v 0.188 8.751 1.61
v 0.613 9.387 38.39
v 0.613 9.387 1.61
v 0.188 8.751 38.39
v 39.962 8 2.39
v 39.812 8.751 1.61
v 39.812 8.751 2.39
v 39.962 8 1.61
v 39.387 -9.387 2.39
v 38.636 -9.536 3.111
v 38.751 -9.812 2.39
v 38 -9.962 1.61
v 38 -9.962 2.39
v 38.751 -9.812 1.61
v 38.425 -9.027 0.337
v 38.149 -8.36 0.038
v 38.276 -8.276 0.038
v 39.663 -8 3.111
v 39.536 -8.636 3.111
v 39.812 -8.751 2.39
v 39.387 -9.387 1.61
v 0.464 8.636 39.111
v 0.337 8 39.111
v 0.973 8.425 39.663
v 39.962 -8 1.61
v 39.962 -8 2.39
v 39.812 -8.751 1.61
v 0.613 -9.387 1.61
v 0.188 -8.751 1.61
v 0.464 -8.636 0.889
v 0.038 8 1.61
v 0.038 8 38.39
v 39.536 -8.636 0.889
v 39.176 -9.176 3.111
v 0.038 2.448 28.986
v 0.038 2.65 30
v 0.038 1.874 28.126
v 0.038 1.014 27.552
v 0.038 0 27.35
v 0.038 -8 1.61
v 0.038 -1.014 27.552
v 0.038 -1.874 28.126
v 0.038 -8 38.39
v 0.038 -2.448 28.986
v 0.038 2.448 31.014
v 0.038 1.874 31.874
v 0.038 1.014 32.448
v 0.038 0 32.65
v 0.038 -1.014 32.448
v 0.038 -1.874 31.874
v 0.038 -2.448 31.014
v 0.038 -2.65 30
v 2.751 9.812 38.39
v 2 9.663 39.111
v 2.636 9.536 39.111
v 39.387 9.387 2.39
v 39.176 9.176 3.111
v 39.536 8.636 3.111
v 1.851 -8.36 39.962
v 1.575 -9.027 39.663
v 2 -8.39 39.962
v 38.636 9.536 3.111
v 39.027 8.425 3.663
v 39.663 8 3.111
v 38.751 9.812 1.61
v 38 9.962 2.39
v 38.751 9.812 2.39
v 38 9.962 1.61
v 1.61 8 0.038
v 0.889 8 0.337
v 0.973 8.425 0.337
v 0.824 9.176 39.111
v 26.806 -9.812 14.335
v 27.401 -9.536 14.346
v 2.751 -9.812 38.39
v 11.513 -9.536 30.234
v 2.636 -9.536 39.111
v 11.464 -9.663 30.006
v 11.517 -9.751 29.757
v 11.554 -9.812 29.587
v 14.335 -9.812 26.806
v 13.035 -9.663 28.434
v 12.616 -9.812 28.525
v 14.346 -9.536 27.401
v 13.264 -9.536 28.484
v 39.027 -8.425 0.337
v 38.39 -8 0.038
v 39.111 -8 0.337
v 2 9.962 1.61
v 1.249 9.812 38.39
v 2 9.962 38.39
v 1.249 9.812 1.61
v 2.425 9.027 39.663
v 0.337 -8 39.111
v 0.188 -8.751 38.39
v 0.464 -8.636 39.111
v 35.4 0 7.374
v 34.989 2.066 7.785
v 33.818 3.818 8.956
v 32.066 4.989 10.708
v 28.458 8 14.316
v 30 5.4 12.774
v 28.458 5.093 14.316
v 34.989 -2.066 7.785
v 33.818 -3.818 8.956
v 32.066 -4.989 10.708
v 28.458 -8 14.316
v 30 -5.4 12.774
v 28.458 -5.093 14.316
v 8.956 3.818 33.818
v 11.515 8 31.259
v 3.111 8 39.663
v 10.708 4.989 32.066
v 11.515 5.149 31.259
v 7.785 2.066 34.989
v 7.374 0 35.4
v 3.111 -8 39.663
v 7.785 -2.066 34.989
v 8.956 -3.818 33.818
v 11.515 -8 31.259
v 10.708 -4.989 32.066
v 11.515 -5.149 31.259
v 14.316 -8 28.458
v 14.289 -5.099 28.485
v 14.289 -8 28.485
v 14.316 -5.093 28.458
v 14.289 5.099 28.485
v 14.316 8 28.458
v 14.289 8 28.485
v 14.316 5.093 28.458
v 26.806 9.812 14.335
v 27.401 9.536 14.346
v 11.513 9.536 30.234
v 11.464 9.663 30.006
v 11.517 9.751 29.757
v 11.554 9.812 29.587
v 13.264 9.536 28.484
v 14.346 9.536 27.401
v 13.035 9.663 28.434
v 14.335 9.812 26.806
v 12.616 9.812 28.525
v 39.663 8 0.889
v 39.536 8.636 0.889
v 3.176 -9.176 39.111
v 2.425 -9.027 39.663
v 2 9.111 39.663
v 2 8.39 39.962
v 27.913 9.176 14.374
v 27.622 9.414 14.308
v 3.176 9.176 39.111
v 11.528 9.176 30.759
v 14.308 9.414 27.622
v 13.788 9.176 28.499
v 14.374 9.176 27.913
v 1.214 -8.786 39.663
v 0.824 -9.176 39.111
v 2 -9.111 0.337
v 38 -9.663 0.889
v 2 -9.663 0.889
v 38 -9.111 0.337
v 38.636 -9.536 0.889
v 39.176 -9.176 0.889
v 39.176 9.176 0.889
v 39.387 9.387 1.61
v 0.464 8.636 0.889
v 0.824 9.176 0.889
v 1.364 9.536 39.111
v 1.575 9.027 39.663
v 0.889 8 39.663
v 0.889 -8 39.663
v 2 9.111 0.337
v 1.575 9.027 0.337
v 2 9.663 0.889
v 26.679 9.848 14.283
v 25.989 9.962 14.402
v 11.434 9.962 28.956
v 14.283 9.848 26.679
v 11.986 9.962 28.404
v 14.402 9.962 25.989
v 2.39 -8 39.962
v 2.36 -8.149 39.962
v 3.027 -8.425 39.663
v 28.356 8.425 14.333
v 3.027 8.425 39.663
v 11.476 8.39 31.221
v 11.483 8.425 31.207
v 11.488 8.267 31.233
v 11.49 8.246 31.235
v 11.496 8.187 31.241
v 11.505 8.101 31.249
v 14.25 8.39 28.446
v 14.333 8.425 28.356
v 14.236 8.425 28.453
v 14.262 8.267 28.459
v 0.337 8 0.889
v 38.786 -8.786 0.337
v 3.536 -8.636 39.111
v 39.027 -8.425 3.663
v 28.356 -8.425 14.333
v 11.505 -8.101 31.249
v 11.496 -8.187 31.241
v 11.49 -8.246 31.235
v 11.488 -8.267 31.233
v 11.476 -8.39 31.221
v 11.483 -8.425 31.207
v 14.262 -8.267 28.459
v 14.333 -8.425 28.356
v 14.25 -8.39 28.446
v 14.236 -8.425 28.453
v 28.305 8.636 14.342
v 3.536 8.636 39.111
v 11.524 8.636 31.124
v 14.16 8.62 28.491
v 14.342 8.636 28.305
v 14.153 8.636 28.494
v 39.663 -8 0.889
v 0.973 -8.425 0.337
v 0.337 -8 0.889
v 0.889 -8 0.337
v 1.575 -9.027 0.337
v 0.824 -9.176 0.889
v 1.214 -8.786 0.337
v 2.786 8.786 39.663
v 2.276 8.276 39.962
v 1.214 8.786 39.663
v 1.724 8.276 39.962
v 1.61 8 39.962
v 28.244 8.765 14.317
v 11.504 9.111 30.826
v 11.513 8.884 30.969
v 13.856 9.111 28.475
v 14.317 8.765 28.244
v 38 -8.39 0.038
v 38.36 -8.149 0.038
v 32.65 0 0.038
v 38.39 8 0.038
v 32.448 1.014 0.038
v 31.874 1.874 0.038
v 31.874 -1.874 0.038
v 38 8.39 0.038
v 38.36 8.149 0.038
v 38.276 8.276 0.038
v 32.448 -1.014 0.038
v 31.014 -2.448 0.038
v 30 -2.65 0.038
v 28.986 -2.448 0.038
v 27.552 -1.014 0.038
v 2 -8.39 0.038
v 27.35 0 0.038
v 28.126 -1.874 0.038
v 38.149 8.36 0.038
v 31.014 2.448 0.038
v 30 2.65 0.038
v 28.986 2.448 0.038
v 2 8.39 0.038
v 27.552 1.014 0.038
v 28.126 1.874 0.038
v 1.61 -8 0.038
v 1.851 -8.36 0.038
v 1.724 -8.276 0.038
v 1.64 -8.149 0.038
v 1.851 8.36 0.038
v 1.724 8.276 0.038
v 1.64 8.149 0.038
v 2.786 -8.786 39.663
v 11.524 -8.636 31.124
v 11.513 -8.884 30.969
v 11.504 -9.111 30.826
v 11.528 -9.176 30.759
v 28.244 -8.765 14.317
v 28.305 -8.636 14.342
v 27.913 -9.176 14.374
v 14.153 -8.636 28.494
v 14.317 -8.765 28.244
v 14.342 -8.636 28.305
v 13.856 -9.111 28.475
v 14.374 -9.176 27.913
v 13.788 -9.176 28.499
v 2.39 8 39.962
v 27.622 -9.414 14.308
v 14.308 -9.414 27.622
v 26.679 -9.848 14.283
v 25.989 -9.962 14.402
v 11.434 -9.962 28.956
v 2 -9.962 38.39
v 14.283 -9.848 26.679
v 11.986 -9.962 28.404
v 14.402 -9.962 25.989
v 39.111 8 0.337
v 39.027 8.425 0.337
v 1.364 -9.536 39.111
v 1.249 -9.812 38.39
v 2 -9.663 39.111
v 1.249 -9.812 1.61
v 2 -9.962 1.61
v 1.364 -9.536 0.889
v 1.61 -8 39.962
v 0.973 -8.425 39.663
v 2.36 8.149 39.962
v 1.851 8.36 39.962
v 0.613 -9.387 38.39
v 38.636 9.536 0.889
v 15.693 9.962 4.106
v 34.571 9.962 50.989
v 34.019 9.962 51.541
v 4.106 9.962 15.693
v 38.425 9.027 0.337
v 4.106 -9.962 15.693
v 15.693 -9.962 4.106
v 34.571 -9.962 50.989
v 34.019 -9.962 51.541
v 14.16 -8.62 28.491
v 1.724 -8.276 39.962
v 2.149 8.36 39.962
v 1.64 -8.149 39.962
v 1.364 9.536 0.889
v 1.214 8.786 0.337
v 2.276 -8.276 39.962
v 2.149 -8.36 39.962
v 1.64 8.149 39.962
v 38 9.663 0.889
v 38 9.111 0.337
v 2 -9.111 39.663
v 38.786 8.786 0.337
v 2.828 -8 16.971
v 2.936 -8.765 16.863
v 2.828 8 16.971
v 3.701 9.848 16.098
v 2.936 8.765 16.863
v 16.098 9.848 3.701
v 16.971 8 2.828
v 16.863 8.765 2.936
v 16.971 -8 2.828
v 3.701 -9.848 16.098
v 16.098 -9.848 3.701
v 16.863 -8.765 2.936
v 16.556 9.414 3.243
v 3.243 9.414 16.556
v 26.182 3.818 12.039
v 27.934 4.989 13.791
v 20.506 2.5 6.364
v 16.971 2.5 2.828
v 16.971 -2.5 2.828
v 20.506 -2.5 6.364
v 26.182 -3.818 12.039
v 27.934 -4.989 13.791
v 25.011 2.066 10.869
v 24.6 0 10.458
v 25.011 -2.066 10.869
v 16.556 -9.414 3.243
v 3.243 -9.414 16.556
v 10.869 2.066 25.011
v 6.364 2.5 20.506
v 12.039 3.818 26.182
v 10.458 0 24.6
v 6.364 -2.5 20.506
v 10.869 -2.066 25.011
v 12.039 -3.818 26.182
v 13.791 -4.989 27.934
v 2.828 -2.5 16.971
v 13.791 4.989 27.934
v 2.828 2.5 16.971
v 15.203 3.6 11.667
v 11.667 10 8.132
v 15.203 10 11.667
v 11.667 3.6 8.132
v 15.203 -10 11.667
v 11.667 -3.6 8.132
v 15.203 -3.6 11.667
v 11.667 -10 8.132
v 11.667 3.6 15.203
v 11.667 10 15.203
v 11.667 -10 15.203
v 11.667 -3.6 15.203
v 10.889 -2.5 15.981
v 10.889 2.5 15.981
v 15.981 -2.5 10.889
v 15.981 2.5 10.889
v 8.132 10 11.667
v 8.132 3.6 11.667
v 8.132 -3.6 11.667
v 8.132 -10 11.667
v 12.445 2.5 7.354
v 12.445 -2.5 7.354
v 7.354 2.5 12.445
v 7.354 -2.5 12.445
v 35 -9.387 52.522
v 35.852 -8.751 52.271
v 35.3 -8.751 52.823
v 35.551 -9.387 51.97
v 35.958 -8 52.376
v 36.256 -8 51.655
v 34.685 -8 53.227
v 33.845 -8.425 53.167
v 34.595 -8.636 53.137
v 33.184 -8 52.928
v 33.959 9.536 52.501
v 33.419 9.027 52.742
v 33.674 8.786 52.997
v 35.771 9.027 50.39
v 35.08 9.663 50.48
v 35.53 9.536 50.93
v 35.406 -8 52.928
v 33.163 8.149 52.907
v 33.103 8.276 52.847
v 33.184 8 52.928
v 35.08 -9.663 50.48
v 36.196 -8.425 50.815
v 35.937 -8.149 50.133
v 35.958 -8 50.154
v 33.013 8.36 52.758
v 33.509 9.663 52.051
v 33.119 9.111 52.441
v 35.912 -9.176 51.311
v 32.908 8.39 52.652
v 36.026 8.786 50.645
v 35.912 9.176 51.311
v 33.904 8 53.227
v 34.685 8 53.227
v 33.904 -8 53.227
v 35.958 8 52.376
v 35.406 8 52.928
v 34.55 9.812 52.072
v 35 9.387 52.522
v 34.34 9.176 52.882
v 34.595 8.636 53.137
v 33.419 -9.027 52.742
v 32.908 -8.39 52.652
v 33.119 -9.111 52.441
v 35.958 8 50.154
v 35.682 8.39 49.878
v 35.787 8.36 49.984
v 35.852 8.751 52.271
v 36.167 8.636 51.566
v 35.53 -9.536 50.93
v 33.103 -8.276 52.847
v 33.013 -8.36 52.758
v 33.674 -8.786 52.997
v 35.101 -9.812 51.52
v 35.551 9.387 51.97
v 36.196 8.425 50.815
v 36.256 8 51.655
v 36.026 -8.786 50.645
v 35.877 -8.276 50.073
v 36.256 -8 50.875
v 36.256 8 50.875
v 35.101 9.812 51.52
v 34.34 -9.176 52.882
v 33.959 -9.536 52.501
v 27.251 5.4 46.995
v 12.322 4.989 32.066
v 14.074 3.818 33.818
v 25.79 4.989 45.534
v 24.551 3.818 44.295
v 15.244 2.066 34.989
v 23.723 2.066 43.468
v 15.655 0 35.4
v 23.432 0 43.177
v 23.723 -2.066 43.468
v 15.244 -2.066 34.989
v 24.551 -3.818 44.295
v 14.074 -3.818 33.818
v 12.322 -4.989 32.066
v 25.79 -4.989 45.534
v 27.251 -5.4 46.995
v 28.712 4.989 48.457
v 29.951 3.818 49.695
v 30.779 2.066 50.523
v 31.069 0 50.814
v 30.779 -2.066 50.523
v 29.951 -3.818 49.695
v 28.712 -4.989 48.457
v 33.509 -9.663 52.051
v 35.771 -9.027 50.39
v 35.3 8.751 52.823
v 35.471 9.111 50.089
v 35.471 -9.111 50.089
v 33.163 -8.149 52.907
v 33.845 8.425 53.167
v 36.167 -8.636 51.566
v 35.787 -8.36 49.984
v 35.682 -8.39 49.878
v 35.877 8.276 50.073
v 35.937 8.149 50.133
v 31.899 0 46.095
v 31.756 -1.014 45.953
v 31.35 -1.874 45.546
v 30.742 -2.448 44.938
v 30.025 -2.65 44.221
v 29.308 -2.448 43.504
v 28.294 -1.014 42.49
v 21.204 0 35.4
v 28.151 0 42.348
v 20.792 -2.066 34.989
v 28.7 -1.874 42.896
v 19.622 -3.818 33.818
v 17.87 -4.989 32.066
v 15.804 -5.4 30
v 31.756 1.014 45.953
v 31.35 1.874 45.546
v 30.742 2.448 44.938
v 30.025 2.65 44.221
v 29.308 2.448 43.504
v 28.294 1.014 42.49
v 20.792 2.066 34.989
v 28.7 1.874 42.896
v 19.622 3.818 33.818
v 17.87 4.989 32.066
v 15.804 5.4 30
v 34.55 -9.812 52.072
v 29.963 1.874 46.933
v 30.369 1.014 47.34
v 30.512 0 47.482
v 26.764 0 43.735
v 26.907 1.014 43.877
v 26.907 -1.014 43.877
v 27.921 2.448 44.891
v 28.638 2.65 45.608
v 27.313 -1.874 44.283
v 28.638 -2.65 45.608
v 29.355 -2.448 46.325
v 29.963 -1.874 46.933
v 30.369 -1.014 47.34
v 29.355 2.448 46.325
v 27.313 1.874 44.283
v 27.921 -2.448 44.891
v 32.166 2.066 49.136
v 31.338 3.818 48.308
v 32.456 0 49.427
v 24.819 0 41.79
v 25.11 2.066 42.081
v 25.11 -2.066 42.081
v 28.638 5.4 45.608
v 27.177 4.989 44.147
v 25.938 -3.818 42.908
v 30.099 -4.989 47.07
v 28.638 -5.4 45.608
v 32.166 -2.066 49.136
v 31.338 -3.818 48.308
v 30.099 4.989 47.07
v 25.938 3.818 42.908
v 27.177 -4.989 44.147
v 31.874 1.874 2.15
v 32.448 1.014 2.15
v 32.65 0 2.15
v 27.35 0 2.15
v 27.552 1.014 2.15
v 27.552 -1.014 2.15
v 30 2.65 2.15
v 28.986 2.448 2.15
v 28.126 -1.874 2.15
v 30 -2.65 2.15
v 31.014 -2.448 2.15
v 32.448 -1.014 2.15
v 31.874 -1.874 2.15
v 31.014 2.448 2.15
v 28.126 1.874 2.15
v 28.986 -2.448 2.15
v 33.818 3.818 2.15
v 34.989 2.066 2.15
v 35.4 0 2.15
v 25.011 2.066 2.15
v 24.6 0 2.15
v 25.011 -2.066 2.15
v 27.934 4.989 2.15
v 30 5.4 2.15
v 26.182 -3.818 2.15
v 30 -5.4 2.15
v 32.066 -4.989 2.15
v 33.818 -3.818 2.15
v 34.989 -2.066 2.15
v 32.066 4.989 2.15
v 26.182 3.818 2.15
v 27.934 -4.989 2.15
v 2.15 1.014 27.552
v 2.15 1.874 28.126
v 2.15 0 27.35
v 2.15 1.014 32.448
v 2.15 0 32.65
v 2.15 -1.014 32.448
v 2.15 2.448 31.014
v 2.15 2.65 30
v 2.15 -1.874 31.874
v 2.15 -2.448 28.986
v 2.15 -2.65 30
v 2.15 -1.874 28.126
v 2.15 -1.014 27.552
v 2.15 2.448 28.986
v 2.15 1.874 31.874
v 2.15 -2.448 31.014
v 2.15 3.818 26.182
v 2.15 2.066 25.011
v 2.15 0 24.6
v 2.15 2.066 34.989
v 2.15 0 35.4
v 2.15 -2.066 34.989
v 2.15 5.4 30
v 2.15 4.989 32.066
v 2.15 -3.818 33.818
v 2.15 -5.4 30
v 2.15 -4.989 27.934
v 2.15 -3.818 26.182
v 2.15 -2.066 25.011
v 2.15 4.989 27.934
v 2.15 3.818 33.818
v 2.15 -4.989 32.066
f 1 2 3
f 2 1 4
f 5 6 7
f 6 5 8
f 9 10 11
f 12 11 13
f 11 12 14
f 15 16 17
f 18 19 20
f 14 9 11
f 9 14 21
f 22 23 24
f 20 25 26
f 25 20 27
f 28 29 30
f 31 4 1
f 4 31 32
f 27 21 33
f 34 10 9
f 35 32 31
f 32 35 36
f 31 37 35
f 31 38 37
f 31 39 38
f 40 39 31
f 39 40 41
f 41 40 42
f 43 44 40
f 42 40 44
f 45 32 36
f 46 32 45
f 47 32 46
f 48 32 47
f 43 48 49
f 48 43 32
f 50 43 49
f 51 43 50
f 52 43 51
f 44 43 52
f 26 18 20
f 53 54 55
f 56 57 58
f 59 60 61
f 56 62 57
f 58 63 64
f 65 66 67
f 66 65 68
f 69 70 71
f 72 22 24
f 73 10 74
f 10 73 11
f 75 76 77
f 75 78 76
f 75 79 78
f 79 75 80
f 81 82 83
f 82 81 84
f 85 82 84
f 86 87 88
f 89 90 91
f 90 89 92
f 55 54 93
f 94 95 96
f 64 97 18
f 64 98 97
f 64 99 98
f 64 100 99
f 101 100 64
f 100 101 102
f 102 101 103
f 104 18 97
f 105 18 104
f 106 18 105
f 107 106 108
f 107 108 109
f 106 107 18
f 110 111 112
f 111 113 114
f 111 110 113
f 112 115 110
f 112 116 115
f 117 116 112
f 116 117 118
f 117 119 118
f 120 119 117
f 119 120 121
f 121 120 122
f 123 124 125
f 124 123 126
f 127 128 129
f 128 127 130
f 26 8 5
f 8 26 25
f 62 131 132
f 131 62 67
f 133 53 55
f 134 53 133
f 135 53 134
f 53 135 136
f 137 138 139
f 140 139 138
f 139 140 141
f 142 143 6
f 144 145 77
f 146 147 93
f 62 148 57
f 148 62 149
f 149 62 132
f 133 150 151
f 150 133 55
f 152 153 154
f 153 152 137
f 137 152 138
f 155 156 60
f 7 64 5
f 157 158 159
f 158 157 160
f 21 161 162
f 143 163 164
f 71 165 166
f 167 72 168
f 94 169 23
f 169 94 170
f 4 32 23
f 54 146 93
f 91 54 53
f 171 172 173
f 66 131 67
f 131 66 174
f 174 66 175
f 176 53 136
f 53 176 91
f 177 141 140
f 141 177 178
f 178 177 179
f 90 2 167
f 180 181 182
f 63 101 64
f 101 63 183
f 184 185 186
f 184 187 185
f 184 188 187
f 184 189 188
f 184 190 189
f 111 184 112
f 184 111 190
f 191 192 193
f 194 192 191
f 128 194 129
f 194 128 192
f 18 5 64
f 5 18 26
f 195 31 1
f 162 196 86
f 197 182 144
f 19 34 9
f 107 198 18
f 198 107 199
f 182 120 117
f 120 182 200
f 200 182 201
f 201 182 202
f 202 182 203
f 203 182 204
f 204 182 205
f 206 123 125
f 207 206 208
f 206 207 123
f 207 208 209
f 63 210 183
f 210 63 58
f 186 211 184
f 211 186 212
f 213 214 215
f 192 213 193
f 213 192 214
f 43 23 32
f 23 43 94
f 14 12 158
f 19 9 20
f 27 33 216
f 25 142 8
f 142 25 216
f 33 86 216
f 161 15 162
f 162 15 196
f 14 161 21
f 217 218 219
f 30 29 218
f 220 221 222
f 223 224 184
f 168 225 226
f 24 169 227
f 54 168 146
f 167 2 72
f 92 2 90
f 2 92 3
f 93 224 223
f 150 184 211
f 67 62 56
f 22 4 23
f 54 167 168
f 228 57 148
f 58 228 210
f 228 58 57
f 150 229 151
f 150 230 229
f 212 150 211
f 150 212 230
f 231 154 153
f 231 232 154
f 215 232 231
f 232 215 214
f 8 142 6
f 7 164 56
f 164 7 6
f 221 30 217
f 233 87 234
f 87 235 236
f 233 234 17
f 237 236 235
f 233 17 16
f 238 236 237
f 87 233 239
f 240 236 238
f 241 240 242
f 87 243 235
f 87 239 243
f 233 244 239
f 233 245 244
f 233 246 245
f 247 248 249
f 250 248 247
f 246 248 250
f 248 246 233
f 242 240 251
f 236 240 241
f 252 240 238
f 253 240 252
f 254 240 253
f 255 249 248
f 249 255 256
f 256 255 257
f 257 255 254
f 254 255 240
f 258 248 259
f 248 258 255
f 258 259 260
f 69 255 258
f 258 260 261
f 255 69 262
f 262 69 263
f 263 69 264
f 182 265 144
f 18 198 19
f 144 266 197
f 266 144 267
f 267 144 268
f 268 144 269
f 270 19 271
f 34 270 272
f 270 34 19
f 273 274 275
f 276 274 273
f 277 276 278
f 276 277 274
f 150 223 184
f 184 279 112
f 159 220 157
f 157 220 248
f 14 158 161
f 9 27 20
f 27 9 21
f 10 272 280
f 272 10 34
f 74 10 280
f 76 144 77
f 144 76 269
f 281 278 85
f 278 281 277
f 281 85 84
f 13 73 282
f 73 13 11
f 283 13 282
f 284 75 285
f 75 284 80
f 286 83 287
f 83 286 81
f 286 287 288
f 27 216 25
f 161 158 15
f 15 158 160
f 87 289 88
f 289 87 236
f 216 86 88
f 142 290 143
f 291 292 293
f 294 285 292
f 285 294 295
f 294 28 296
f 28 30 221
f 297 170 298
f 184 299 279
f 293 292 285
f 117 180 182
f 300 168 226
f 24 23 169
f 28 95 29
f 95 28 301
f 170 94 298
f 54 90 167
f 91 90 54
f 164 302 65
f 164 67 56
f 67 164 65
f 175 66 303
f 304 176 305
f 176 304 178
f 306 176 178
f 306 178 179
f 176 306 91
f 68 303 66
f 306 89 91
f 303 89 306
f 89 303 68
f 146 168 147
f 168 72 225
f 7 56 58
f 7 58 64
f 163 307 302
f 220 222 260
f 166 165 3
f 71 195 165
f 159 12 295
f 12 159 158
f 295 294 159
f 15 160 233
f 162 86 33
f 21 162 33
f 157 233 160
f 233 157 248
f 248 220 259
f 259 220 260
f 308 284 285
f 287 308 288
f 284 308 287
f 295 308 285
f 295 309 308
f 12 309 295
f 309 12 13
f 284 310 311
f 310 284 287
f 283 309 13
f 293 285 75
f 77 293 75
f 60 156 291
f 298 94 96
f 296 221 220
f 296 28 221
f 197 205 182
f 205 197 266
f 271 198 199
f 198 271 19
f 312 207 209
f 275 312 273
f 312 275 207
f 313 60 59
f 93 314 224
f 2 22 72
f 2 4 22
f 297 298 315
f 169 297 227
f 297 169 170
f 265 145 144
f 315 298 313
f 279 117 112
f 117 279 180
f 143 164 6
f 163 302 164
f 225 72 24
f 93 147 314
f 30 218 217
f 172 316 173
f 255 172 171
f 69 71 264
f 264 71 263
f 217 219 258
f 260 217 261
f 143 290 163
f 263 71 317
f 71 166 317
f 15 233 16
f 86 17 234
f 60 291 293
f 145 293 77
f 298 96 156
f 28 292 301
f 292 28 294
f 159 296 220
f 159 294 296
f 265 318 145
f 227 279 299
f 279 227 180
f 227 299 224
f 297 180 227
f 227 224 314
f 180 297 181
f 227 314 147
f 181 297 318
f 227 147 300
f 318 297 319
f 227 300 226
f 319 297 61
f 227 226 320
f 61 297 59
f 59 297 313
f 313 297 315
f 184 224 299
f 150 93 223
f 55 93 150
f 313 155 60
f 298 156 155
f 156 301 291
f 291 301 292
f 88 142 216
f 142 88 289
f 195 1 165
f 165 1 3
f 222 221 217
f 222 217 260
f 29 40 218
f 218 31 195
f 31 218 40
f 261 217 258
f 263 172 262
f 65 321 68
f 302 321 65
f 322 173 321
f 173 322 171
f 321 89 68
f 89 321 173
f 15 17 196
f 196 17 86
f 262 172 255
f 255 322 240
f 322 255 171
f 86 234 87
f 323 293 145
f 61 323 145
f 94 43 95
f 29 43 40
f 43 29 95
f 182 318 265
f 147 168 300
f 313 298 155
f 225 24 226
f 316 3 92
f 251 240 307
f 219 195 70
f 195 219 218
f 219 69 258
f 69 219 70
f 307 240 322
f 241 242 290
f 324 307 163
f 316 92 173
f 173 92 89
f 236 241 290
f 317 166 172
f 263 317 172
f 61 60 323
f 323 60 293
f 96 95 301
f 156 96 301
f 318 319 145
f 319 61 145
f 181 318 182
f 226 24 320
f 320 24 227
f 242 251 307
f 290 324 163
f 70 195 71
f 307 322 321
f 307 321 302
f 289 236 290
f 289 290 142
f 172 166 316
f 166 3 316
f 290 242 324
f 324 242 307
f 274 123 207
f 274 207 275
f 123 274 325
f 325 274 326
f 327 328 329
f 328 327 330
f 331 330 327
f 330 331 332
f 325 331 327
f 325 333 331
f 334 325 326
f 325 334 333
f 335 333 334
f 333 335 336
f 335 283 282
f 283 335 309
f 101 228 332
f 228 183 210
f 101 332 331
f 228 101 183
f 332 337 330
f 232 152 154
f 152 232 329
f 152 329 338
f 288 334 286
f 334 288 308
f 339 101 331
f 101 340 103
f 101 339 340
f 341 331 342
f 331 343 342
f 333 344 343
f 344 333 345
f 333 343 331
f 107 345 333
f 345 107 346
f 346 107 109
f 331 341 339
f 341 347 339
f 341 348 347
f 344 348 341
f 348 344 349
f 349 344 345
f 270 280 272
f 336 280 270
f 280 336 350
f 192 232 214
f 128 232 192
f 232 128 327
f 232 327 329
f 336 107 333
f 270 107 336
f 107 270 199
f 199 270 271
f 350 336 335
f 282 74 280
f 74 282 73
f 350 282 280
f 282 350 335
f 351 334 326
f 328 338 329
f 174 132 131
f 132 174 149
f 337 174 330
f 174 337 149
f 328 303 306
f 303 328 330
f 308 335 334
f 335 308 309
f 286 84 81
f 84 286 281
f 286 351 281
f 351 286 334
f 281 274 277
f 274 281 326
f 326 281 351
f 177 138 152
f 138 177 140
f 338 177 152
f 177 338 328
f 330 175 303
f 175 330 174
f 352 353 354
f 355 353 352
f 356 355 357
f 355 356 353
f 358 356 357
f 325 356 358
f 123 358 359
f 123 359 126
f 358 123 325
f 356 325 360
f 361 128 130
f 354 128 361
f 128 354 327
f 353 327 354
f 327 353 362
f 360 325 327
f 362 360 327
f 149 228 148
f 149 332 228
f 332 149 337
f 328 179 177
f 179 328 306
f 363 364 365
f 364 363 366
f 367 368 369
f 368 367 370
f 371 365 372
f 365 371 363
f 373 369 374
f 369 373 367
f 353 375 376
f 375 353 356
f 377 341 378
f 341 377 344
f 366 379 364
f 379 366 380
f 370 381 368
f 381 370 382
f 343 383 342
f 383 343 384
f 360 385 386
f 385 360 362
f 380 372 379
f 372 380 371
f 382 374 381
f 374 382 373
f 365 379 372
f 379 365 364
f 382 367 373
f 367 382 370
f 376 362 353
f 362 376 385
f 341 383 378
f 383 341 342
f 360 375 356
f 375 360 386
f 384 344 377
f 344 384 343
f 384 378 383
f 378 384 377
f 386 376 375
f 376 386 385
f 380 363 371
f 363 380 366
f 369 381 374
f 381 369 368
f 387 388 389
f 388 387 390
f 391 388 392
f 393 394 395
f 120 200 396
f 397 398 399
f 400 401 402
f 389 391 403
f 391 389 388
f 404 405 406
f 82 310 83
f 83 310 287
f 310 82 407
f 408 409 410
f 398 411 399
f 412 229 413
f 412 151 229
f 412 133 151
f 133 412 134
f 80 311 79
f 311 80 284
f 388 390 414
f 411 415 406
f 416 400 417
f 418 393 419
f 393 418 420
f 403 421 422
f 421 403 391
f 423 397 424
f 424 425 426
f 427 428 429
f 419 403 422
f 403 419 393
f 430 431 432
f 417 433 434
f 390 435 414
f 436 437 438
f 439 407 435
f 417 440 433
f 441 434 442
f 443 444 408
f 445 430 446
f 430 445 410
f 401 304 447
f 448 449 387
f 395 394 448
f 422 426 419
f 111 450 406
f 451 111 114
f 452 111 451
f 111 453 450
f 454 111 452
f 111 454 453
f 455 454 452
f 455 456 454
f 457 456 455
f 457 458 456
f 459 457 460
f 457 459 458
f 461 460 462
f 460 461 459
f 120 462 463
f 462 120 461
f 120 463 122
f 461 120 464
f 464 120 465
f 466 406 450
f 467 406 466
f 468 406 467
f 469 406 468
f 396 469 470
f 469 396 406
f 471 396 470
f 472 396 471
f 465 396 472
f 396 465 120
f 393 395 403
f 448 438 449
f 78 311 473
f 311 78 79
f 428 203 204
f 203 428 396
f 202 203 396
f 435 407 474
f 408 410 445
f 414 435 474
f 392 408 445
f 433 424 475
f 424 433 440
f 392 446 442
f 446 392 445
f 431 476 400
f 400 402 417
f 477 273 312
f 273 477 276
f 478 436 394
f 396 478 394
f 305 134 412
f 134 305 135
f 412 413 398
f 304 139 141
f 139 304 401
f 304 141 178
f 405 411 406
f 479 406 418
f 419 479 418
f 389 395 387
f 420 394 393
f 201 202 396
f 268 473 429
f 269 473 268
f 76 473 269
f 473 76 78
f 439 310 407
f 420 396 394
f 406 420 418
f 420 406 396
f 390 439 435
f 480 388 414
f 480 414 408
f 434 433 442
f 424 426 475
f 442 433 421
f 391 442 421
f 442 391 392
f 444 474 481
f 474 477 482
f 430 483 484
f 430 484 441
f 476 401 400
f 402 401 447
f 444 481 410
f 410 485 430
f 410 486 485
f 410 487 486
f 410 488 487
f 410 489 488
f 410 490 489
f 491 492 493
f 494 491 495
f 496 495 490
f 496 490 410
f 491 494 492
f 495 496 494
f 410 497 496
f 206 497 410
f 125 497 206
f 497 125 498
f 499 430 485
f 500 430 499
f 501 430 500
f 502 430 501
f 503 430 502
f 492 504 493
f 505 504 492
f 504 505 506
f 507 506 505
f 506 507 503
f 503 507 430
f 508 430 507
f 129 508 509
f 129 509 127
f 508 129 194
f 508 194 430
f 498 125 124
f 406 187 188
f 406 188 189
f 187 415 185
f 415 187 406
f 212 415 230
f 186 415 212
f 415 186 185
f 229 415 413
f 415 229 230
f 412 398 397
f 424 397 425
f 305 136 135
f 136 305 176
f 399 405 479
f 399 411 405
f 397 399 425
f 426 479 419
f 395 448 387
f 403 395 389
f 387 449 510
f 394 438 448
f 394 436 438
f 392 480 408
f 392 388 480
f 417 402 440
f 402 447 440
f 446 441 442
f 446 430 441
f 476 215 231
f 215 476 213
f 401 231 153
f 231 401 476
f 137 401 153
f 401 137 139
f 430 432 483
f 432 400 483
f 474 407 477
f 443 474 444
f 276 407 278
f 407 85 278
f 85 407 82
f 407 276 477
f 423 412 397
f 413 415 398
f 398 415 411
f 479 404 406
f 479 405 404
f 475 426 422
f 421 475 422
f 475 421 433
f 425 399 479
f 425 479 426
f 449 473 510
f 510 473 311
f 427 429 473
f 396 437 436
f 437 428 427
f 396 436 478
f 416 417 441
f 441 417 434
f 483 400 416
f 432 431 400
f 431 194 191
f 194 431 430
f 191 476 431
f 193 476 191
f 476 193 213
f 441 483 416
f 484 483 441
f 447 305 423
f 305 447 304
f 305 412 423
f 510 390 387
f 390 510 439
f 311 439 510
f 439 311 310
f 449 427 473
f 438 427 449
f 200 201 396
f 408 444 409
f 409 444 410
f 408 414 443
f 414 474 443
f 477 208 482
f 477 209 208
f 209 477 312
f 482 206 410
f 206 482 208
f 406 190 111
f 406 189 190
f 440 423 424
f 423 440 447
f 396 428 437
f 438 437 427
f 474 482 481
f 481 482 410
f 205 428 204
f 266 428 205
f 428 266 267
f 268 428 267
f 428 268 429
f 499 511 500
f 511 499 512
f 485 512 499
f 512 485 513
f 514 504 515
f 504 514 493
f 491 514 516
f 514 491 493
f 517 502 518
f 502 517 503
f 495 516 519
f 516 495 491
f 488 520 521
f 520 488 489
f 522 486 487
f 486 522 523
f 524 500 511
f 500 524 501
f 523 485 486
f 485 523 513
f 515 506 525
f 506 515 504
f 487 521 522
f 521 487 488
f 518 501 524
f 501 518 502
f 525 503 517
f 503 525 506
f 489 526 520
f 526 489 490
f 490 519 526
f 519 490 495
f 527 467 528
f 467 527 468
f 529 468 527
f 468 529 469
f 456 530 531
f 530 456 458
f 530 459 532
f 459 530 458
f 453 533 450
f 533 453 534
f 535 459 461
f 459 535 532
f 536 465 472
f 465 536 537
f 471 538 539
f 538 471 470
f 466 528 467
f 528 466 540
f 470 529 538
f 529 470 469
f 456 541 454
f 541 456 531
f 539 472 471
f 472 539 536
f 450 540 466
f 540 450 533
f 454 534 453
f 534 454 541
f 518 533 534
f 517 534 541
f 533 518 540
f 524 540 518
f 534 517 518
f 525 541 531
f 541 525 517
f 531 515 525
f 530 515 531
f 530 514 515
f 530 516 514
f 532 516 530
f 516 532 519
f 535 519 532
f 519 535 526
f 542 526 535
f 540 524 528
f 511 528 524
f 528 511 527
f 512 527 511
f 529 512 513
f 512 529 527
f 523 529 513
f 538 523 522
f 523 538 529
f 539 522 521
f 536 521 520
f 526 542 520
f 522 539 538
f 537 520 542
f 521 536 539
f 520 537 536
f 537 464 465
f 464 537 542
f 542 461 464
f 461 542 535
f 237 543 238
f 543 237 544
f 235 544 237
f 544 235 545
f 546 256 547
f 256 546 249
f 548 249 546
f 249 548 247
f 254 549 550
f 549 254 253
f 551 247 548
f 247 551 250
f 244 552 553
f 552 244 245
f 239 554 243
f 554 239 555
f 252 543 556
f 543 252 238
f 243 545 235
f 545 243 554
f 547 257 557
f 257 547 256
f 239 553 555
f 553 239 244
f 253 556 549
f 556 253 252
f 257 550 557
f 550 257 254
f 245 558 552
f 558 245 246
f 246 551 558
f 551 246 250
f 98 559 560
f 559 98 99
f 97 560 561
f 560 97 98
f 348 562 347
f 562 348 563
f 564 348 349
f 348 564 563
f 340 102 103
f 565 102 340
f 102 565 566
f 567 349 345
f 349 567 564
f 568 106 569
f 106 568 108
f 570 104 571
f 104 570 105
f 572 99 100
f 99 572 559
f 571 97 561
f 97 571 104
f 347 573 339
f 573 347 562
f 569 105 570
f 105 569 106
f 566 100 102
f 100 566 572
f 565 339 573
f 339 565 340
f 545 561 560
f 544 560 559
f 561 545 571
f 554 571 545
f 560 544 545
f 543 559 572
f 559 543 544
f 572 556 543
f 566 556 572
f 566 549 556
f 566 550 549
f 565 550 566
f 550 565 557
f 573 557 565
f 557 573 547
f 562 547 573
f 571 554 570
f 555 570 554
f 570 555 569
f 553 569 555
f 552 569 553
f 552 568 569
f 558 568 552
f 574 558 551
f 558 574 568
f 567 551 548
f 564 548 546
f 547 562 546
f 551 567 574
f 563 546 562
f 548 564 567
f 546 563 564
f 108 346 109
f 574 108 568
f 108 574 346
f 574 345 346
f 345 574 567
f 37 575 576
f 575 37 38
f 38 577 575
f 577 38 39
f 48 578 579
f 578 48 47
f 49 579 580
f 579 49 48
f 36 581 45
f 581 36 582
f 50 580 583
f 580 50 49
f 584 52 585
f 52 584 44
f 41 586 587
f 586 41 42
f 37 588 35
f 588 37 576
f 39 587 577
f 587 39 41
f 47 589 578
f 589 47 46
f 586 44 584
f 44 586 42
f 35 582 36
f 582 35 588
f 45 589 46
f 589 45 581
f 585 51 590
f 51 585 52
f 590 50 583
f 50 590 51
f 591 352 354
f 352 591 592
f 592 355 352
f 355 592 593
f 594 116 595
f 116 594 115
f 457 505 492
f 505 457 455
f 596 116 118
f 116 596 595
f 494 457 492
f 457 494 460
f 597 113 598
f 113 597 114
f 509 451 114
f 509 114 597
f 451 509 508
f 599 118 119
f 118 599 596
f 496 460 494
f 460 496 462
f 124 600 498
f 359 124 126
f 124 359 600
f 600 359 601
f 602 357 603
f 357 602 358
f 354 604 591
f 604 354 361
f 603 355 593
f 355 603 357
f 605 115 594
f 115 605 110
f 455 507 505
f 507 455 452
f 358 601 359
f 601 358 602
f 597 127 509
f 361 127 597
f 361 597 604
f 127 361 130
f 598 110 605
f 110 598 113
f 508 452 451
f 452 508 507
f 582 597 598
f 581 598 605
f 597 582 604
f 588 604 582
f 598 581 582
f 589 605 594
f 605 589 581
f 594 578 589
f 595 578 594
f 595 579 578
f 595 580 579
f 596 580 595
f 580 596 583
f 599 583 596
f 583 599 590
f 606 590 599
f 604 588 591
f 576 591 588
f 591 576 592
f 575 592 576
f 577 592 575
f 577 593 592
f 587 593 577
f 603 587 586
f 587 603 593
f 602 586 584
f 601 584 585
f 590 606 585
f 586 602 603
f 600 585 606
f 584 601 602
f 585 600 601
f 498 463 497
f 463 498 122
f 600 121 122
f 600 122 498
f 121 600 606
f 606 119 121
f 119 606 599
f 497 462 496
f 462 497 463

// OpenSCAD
$fn=16;
l1 = 40;
l2 = 40;
l3 = 48.5;
l=l3;
// profile width
prof = 20;
nut = 5;
nutHead = 10.5;
//thickness of plastic under bolt head
padH = 2.15;
// rounding
r=2;
//compensation of overextrusion of printer
tol = 0.15;
not = 0.001+0;
inf = prof*1.2;
wall=prof/5;


//size of notches
h=5;
//center skewed bolt
center = 0;
notchX = 5;
notchY = 6.4;


difference(){
	union(){
		difference(){
			body1();
			rotate([0,45,0]) translate([-prof/2,-prof/2,prof/2+wall]) profile(l=inf);
		}
		rotate([0,45,0])translate([0,0,prof/2+wall]) difference(){
			notches(h=h);
			innerCube(h=h);
		}
		rotate([0,-45,0]) translate([prof/2+wall,0,prof/2+r]) body2();
	}
	rotate([0,-45,0]) translate([prof/2+wall+l3-prof/2,0,prof/2+r]) nut();
	holes();
}

module holes(){
	translate([l1-prof/2,0,padH]) nut();
	translate([padH,0,l2-prof/2]) rotate([0,90,0]) nut();
}

module nut(){
	translate([0,0,-inf+not]) cylinder(d=nut+2*tol,h=inf);
	cylinder(d=nutHead+2*tol,h=inf);
}

module body1(){
	hull(){
		cornersCenter();
		cornersSide();
		cornersTop();
	}
}

module cornersCenter(){
	translate([r,prof/2-r,r]) sphere(r=r);
	translate([r,-prof/2+r,r]) sphere(r=r);
}

module cornersSide(){
	translate([l1-r,prof/2-r,r]) sphere(r=r);
	translate([l1-r,-prof/2+r,r]) sphere(r=r);
}

module cornersTop(){
	translate([r,prof/2-r,l2-r]) sphere(r=r);
	translate([r,-prof/2+r,l2-r]) sphere(r=r);
}


///////////////////////////////////////

//translate([0,0,0]) rotate([0,45,180]) difference(){
//	union(){
//		translate([0,0,prof/2]) rotate([90,0,90])translate([0,0,-h]) difference(){
//			notches(h=h);
//			innerCube(h=h);
//		}
//
//		wedge();
//		body2();
//	}
//	holes2();
//}

module innerCube(h=10){
	w = prof-2*notchY;
	translate([0,0,h/2]) cube([w,w,h+not], true);
	if(center) translate([0,notchY/2,h/2]) cube([w,w+notchY,h+not], true);	
}

module notches(h=10){
	translate([0,0,h/2]) cube([notchX,prof,h], true);
	translate([0,0,h/2]) cube([prof,notchX,h], true);
}

module holes2(){
	//translate([-l/2,0,prof+padH]) nut();
	//l2=center ? (prof/2*sqrt(2)) : prof;
	rotate([0,-45,0]) translate([l2,0,padH]) nut();
}


module wedge(){
	hull(){
		translate([0,-prof/2+r,r]) rotate([0,90,0]) cylinder(r=r, h=not);
		translate([0,prof/2-r,r]) rotate([0,90,0]) cylinder(r=r, h=not);
		
		translate([0,-prof/2,prof]) sphere(r=not);
		translate([0,prof/2,prof]) sphere(r=not);		
		
		points1();
	}	
}

module body2(){
	//rs2 = r/sqrt(2);
	hull(){	
		translate([r,prof/2-r,0]) sphere(r=r);
		translate([l3-r,prof/2-r,0]) sphere(r=r);
		translate([r,-prof/2+r,0]) sphere(r=r);
		translate([l3-r,-prof/2+r,0]) sphere(r=r);
		
		//points1();
		
		//translate([0,-prof/2,prof]) sphere(r=not);
		//translate([0,prof/2,prof]) sphere(r=not);
	
		//translate([-l,-prof/2+r,prof+r]) sphere(r=r);
		//translate([-l,prof/2-r,prof+r]) sphere(r=r);
	}
}

module points1(){
	rotate([0,-45,0]) translate([prof*sqrt(2),-prof/2+r,r]) sphere(r=r);
	rotate([0,-45,0]) translate([prof*sqrt(2),prof/2-r,r]) sphere(r=r);
}

module profile(l=10){
	hull(){
		translate([r,r,0]) cylinder(h=l,r=r);
		translate([prof-r,r,0]) cylinder(h=l,r=r);
		translate([r,prof-r,0]) cylinder(h=l,r=r);
		translate([prof-r,prof-r,0]) cylinder(h=l,r=r);
	}
}
